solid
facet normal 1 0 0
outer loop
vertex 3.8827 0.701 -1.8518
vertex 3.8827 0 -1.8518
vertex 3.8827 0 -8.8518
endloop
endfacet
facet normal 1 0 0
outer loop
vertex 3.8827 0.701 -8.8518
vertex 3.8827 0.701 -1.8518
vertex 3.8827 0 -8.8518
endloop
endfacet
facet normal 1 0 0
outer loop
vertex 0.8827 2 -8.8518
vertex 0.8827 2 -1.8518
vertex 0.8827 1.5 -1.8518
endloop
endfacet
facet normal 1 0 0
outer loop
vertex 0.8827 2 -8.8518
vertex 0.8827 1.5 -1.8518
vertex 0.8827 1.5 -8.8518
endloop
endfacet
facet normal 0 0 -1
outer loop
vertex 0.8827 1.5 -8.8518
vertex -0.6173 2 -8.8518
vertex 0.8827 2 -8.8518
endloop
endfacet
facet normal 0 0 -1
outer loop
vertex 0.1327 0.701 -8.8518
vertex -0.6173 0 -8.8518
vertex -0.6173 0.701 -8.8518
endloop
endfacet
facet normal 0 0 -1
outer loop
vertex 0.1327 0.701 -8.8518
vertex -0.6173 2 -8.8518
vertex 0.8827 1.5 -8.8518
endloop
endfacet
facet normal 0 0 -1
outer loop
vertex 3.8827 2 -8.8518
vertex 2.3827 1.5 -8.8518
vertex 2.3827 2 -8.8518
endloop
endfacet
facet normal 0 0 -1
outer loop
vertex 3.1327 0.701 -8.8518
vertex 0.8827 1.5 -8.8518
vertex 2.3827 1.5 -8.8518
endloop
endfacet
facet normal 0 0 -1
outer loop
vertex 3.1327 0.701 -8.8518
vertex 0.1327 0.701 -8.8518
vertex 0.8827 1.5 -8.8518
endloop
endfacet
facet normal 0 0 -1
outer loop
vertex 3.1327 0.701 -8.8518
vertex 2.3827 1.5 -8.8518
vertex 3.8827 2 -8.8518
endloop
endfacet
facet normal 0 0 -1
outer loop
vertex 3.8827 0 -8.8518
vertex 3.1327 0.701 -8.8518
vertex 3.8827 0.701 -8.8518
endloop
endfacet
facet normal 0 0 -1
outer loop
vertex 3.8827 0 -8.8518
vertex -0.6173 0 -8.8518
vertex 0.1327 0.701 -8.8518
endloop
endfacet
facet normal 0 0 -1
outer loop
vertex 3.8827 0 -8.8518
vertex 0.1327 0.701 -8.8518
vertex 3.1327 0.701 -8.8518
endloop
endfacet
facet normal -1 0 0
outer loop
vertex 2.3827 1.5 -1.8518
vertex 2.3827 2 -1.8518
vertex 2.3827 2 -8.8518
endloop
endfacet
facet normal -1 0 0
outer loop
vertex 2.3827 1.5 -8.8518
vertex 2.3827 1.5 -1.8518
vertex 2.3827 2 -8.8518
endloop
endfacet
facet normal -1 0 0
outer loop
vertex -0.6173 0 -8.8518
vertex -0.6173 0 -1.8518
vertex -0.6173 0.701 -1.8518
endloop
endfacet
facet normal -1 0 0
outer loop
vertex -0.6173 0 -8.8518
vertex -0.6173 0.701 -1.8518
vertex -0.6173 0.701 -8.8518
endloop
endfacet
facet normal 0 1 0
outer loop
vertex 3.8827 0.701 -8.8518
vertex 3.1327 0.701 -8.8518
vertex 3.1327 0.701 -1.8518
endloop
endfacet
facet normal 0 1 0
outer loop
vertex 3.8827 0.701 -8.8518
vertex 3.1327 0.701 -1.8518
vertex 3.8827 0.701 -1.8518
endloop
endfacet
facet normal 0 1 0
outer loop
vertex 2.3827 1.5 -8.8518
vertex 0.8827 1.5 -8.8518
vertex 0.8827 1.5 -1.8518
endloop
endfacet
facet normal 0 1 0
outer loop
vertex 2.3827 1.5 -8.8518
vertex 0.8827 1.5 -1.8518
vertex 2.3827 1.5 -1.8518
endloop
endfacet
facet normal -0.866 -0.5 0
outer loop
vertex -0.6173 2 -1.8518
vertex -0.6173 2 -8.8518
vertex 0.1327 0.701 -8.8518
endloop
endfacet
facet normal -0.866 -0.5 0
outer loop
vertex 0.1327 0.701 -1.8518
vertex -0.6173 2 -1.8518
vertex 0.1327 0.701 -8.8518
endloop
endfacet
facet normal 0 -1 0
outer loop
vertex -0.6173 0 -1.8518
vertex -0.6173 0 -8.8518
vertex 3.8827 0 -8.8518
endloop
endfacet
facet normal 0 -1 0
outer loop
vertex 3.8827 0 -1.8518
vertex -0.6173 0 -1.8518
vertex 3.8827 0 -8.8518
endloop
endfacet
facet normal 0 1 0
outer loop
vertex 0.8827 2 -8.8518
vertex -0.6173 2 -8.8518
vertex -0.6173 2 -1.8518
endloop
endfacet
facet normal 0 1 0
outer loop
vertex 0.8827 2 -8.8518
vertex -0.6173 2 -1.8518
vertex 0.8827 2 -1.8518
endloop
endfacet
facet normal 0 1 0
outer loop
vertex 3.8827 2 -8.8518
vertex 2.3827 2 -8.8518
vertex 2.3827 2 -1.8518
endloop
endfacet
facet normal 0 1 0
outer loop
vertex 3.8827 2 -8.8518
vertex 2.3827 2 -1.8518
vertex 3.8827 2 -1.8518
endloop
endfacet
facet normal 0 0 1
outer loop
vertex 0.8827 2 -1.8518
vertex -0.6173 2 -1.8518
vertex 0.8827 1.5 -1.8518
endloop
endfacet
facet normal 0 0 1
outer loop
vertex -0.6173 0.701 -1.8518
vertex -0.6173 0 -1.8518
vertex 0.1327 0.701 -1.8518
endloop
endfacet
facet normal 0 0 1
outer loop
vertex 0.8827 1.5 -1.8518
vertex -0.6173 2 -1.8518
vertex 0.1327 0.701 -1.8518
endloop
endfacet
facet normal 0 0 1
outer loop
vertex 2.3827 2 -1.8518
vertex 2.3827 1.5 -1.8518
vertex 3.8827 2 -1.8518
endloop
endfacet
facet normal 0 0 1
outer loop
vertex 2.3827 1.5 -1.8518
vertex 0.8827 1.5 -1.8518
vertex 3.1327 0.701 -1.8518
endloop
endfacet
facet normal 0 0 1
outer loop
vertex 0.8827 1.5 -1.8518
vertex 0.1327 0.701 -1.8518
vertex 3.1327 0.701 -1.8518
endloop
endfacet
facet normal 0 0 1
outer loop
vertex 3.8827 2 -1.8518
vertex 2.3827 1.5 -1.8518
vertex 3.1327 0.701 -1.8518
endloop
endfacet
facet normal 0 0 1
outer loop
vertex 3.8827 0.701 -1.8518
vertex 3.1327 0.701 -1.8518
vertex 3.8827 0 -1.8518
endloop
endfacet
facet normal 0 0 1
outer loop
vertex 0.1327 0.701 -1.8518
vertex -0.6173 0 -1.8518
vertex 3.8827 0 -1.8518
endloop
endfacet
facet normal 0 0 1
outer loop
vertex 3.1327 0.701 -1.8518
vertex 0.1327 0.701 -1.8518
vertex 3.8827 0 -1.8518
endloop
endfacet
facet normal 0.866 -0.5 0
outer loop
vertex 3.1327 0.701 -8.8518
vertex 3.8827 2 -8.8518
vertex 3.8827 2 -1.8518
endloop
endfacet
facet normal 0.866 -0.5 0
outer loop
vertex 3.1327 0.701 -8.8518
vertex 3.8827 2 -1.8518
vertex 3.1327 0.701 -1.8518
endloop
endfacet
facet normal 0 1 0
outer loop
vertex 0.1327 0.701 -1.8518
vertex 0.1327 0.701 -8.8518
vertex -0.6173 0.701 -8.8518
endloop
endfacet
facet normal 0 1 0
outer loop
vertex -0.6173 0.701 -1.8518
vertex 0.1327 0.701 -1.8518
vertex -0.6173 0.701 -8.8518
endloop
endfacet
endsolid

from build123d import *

# Parameters (mm, degrees)
SKETCH1_W           = 4.5
SKETCH1_H           = 7
BOSS_EXTRUDE1_DEPTH = 2
SKETCH2_W           = 1.5
SKETCH2_H           = 7
CUT_EXTRUDE3_DEPTH  = 0.5
CUT_EXTRUDE4_DEPTH  = 9.250795932


with BuildPart() as part:
    # Sketch1 → Boss-Extrude1 (new body)
    with BuildSketch(Plane(origin=(0, 0, 0), x_dir=(1, 0, 0), z_dir=(0, 1, 0))):
        with Locations((1.632735313, 5.351794061)):
            Rectangle(SKETCH1_W, SKETCH1_H)
    extrude(amount=BOSS_EXTRUDE1_DEPTH)

    # Sketch2 → Cut-Extrude3 (cut)
    with BuildSketch(Plane(origin=(0, 2, 0), x_dir=(1, 0, 0), z_dir=(0, 1, 0))):
        with Locations((1.632735313, 5.351794061)):
            Rectangle(SKETCH2_W, SKETCH2_H)
    extrude(amount=-CUT_EXTRUDE3_DEPTH, mode=Mode.SUBTRACT)

    # Sketch3 → Cut-Extrude4 (cut, through all)
    with BuildSketch(Plane(origin=(0, 0, -8.851794061), x_dir=(-1, 0, 0), z_dir=(0, 0, -1))):
        Polygon((0.617264687, 2), (-0.132735313, 0.700961894), (0.617264687, 0.700961894), align=None)
        Polygon((-3.882735313, 2), (-3.132735313, 0.700961894), (-3.882735313, 0.700961894), align=None)
    extrude(amount=-CUT_EXTRUDE4_DEPTH, mode=Mode.SUBTRACT)


solid = part.part
